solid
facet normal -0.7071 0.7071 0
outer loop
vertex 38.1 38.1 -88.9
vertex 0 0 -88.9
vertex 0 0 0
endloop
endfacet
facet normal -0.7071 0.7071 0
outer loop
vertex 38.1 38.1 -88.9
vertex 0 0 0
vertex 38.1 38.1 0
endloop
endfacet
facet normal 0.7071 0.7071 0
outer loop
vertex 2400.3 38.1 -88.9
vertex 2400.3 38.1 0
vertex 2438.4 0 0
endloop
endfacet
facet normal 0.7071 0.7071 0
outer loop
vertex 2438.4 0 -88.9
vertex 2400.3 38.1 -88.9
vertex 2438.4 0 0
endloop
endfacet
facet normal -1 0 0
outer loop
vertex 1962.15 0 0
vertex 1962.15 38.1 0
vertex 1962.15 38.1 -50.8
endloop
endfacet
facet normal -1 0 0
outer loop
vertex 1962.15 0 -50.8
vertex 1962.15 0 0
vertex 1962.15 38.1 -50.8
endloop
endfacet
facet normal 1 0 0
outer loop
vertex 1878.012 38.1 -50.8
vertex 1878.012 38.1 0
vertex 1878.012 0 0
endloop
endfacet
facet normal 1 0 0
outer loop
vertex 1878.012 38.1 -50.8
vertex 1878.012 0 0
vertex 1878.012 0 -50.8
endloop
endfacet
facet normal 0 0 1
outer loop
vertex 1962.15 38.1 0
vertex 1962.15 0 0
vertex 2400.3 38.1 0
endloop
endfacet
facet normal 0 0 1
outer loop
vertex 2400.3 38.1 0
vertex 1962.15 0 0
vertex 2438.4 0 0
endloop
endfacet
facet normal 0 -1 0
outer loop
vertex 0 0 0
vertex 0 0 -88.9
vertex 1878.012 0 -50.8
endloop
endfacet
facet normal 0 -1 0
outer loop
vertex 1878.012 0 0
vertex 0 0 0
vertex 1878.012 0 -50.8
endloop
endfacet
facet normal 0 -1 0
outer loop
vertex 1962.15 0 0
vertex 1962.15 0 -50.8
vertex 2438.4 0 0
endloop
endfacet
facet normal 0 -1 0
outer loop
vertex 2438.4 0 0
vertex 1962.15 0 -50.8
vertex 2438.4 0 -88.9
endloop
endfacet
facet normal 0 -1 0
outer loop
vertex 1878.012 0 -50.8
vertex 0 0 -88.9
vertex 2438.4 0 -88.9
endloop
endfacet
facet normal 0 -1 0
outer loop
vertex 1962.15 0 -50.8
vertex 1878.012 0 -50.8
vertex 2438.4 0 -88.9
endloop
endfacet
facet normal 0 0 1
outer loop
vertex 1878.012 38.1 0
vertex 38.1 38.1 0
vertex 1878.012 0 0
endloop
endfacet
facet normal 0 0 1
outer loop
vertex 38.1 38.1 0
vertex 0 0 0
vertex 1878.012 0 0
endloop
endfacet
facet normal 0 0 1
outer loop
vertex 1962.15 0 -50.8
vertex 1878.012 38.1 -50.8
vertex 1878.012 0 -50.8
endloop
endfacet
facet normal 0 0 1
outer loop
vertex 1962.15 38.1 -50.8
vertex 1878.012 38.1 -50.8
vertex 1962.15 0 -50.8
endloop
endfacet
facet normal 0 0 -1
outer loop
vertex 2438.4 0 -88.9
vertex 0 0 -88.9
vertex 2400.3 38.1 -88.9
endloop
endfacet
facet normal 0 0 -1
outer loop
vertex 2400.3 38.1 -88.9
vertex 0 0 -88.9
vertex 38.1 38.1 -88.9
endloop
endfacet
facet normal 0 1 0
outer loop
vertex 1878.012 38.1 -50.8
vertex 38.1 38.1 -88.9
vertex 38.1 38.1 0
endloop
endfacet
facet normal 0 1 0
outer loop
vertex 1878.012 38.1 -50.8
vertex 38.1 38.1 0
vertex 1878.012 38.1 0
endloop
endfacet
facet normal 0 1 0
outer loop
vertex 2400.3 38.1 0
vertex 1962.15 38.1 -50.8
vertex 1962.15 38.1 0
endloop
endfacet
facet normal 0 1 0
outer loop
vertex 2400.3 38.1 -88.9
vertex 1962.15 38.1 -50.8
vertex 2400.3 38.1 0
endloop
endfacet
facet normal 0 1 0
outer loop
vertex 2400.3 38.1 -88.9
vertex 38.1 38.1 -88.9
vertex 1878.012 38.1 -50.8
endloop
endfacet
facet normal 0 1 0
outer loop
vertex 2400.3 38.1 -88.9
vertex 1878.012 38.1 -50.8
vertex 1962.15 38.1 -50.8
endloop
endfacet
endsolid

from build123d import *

# Parameters (mm, degrees)
SKETCH1_W           = 2438.4
SKETCH1_H           = 88.9
BOSS_EXTRUDE1_DEPTH = 38.1
CUT_EXTRUDE1_DEPTH  = 89.9
SKETCH3_W           = 84.1375
SKETCH3_H           = 50.8
CUT_EXTRUDE2_DEPTH  = 39.1


with BuildPart() as part:
    # Sketch1 → Boss-Extrude1 (new body)
    with BuildSketch(Plane(origin=(0, 0, 0), x_dir=(1, 0, 0), z_dir=(0, 1, 0))):
        with Locations((1219.2, 44.45)):
            Rectangle(SKETCH1_W, SKETCH1_H)
    extrude(amount=BOSS_EXTRUDE1_DEPTH)

    # Sketch2 → Cut-Extrude1 (cut, through all)
    with BuildSketch(Plane.XY):
        Polygon((0, 0), (38.1, 38.1), (0, 38.1), align=None)
        Polygon((2438.4, 0), (2438.4, 38.1), (2400.3, 38.1), align=None)
    extrude(amount=-CUT_EXTRUDE1_DEPTH, mode=Mode.SUBTRACT)

    # Sketch3 → Cut-Extrude2 (cut, through all)
    with BuildSketch(Plane(origin=(0, 38.1, 0), x_dir=(1, 0, 0), z_dir=(0, 1, 0))):
        with Locations((1920.08125, 25.4)):
            Rectangle(SKETCH3_W, SKETCH3_H)
    extrude(amount=-CUT_EXTRUDE2_DEPTH, mode=Mode.SUBTRACT)


solid = part.part
